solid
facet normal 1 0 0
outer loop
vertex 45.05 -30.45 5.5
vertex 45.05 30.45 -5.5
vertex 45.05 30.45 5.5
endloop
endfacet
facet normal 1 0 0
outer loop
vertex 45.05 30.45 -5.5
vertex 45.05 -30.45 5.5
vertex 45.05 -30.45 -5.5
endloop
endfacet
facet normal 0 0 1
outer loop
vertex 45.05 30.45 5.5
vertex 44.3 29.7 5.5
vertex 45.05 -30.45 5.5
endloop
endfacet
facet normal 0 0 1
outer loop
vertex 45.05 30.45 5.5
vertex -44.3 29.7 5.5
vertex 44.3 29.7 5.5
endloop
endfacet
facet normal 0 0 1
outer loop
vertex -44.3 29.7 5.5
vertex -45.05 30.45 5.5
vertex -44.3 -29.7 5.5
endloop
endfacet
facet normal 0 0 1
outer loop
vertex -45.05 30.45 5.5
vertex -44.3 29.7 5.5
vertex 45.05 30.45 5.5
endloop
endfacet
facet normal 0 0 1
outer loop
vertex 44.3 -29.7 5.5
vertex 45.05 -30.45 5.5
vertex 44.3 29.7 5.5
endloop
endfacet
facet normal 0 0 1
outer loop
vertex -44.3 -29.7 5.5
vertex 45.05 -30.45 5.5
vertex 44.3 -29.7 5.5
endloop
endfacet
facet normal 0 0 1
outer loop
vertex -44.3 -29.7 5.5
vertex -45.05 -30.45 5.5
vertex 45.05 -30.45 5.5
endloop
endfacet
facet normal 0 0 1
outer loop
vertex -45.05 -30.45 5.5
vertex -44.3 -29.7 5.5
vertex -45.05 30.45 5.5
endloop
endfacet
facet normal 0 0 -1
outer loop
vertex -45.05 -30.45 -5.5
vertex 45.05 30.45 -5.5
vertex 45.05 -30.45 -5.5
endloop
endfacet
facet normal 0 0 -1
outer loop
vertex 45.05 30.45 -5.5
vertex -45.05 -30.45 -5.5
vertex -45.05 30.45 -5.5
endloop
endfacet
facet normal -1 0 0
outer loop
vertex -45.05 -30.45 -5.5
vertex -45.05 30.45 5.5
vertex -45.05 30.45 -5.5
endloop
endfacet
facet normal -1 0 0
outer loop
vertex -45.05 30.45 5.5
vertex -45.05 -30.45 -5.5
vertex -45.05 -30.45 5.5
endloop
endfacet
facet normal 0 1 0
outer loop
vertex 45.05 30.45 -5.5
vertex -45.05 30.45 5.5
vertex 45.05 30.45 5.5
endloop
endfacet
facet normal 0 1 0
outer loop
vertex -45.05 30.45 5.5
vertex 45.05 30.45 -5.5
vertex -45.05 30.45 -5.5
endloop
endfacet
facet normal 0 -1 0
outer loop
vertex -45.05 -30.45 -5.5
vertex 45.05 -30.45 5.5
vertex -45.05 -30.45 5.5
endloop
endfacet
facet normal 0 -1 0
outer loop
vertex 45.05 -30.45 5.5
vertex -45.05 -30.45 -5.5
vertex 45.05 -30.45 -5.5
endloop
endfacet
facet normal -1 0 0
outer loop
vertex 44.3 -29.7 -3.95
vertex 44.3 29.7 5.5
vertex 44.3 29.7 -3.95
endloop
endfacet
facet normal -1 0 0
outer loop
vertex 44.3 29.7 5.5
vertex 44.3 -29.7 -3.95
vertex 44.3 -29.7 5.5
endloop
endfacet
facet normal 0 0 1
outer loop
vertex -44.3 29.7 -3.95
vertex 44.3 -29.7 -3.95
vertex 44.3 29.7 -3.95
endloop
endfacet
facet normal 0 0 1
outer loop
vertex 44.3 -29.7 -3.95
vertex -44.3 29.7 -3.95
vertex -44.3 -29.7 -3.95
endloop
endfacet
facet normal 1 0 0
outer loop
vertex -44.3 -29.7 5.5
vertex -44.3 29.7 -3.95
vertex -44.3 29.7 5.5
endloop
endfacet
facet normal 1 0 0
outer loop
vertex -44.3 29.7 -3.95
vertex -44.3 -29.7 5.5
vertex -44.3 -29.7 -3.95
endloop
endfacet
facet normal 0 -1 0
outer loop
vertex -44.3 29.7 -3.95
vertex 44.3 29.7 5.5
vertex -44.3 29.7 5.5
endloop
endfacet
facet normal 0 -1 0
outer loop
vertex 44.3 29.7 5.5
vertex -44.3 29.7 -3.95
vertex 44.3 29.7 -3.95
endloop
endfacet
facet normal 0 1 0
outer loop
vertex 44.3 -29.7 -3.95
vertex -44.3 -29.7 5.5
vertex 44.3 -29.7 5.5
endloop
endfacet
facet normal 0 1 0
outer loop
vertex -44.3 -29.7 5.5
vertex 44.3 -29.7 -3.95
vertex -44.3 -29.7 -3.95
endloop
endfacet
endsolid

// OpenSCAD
pi_x = 85;
sd_x = 1.5;
sd_y = 21;
sd_z = 1;
plug_x = 2;

pi_y = 57.5;

pi_z = 23.0;

wall_thickness = .75;
pi_x_clearance = .2;
pi_y_clearance = .2;
pi_z_clearance = .2;

sd_x_clearance = .2;
sd_y_clearance = .2;
sd_z_clearance = 1;

floor_width = 1;

//Double the - clearance for the SD
bottom_base_block_x = sd_x + pi_x + wall_thickness*2 + pi_x_clearance*2+ sd_x_clearance;

bottom_base_block_y = pi_y + pi_y_clearance*2 + wall_thickness*2;
bottom_base_block_z = floor_width + pi_z + pi_z_clearance;

top_base_block_x = bottom_base_block_x + 1.5;

top_base_block_y = bottom_base_block_y + 1.5;

top_base_block_z = 10 + floor_width;

difference(){
    cube([top_base_block_x,top_base_block_y, top_base_block_z], center=true);

    translate([0,0,floor_width+.05])
    cube([bottom_base_block_x,bottom_base_block_y, 10],center=true);
}
